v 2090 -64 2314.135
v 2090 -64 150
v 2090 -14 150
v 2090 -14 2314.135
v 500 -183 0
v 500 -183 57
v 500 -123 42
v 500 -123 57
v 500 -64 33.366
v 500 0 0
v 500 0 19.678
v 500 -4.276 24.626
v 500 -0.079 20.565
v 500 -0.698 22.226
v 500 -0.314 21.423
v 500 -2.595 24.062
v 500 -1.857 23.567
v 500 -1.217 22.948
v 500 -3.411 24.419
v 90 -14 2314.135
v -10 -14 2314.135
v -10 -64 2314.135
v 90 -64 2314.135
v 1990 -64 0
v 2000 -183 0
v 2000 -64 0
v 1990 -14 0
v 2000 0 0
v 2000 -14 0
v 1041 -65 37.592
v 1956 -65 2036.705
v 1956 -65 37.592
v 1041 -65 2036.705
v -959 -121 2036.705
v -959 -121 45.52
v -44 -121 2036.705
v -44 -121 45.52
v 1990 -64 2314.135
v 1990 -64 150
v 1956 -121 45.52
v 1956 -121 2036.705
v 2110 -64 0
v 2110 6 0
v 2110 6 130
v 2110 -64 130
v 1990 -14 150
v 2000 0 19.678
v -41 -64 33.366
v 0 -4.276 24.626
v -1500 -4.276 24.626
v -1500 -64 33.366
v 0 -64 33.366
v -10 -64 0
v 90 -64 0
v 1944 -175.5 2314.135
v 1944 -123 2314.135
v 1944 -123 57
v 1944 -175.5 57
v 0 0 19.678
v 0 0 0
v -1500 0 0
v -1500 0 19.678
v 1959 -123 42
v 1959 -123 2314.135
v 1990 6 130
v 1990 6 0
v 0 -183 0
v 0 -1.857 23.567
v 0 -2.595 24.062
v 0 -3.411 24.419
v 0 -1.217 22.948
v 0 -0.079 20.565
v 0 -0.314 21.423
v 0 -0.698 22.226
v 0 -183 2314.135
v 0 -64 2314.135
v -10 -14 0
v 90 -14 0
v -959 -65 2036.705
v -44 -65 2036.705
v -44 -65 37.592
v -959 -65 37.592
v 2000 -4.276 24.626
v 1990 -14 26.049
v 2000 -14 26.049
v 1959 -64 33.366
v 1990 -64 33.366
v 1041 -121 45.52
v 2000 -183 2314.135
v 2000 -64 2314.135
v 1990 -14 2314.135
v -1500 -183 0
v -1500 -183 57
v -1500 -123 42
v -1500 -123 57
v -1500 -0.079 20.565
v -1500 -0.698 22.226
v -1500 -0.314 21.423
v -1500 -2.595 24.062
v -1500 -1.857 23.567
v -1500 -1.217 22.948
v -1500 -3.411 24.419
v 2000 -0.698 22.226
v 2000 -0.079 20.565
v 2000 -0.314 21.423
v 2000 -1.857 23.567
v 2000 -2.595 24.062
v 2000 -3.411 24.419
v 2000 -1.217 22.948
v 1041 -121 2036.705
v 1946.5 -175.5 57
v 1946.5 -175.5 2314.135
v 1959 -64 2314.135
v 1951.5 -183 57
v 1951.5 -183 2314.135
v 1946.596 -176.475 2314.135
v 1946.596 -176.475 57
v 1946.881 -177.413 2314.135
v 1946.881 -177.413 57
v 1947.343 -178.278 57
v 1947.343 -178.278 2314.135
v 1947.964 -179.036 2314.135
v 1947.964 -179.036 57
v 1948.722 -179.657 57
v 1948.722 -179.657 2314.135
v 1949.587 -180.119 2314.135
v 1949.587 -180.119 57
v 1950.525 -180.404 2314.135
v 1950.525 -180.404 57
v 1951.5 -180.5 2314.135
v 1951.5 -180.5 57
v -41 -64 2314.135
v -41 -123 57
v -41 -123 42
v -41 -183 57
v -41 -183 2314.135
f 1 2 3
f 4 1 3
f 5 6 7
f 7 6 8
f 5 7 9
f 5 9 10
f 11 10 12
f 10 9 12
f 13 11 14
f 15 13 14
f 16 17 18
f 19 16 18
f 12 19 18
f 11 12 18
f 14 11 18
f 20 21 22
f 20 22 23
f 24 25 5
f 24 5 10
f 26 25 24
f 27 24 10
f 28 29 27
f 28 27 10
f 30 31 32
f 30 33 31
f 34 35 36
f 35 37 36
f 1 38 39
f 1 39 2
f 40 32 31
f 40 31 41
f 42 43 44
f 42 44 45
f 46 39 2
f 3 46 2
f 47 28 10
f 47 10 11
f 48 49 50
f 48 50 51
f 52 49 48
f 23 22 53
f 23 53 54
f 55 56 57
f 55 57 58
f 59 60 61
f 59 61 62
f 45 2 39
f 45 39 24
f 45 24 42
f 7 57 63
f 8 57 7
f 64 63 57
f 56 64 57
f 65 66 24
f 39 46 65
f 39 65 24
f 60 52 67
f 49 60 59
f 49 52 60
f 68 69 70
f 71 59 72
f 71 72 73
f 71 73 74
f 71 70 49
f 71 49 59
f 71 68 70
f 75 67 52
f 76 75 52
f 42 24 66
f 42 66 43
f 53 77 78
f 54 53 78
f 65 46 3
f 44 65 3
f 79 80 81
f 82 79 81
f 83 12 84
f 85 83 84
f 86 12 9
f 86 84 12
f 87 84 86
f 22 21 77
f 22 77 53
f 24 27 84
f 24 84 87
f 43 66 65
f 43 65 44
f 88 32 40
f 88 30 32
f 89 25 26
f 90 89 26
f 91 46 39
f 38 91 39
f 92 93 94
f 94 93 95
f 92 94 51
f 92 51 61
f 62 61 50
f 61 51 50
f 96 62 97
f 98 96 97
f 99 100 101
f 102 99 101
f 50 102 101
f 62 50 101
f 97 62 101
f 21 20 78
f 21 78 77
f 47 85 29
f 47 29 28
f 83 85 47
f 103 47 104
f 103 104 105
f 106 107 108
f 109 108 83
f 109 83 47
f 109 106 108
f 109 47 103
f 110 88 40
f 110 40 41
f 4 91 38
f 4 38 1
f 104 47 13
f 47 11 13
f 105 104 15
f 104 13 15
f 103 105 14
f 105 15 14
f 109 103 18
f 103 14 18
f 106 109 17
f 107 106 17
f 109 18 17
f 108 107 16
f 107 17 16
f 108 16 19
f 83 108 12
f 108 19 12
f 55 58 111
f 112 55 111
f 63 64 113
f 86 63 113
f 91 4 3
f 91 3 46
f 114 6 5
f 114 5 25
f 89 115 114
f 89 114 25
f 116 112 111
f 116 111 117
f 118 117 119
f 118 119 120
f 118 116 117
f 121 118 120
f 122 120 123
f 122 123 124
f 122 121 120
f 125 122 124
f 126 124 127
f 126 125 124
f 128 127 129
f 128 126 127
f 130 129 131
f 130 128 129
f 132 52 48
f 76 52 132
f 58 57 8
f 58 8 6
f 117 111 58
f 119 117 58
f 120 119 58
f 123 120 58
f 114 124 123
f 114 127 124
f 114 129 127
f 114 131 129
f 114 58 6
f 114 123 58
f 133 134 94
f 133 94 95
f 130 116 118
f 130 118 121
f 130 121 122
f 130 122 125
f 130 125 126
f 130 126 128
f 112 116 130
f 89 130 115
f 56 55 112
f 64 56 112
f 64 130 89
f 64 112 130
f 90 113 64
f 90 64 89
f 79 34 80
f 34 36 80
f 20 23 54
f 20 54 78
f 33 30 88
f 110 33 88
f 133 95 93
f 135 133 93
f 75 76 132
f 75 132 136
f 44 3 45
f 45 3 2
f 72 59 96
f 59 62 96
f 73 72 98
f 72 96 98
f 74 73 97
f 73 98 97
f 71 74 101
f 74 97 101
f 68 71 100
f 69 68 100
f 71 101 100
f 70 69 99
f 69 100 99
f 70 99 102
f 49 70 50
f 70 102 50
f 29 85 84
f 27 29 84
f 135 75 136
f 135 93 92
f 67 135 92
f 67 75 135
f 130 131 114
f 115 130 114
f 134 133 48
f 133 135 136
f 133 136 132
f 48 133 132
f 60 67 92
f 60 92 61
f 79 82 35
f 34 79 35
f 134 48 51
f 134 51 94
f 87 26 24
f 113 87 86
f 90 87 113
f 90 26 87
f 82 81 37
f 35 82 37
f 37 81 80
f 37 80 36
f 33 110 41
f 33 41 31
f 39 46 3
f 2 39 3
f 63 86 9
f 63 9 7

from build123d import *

# Parameters (mm, degrees)
F1_DEPTH  = 1500
F2_DEPTH  = 56
F4_DEPTH  = 3
F5_DEPTH  = 900
F7_DEPTH  = 2314.1348951653
F9_DEPTH  = 150
F10_W     = 120
F10_H     = 70
F11_DEPTH = 150
F12_SIZE  = 20
F13_R     = 5
F13_2_R   = 5
F14_DEPTH = 15
F15_DEPTH = 15
F16_DEPTH = 15
F17_DEPTH = 15
F19_DEPTH = 2257.1348951653


# Not quite as in the source:
# - a feature of the source that left no trace in its solid (it failed there, or was rolled back) is left out


with BuildPart() as f1:
    # F0 (on Right) → F1 (new body)
    with BuildSketch(Plane.YZ):
        Polygon((-183, 0), (0, 0), (0, 24), (-64, 33.3658536585), (-123, 42), (-123, 57), (-183, 57), align=None)
    extrude(amount=-F1_DEPTH)

    # F0 (on Right) → F2 (join)
    with BuildSketch(Plane.YZ):
        Polygon((-183, 161.9052439928), (-183, 57), (-123, 57), (-123, 42), (-64, 33.3658536585), (-64, 167.0590639114), (-64, 2314.1348951653), (-183, 2314.1348951653), align=None)
        Polygon((-65, 2037.5547998742), (-65, 37.5547998742), (-121, 45.7499218254), (-121, 2037.5547998742), align=None, mode=Mode.SUBTRACT)
        Polygon((-121, 45.7499218254), (-65, 37.5547998742), (-65, 2037.5547998742), (-121, 2037.5547998742), align=None)
    extrude(amount=-F2_DEPTH)


with BuildPart() as f4:
    # F3 (on face) → F4 (new body)
    with BuildSketch(Plane(origin=(-56, 0, 0), x_dir=(0, -1, 0), z_dir=(-1, 0, 0))):
        Polygon((65, 37.5920394199), (121, 45.5200997288), (121, 2036.7051838202), (65, 2036.7051838202), align=None)
    extrude(amount=F4_DEPTH)


with BuildPart() as f5:
    # F5 (new): a face of the model
    f5_faces = [f4.part.faces().sort_by_distance(p)[0] for p in [
        (-59, -92.9814562157, 1039.1293140523),
    ]]
    extrude(f5_faces, amount=F5_DEPTH)


with BuildPart() as f7:
    # F6 (on face) → F7 (new body, through all)
    with BuildSketch(Plane.XY.offset(2314.1348951653)):
        Polygon((-10, -14), (-10, -64), (0, -64), (90, -64), (90, -14), align=None)
    extrude(amount=-F7_DEPTH)


with BuildPart() as f8_1:
    # F8: copy of F7
    add(f7.part.moved(Location((2000, 0, 0))))


with BuildPart() as f8_2:
    # F8: copy of F1
    add(f1.part.moved(Location((2000, 0, 0))))


with BuildPart() as f8_3:
    # F8: copy of F5
    add(f5.part.moved(Location((2000, 0, 0))))

    # F17 (add): a face of the model
    f17_faces = [f8_3.faces().sort_by_distance(p)[0] for p in [
        (1941, -92.9814562157, 1039.1293140523),
    ]]
    extrude(f17_faces, amount=F17_DEPTH)


with BuildPart() as f9_tool:
    # F9 (cut): a face of the model
    f9_faces = [f8_1.part.faces().sort_by_distance(p)[0] for p in [
        (2040, -39, 0),
    ]]
    extrude(f9_faces, amount=-F9_DEPTH)


with BuildPart() as f8_1_1:
    add(f8_1.part)

    # F9: cut by f9_tool
    add(f9_tool.part, mode=Mode.SUBTRACT)


with BuildPart() as f8_2_1:
    add(f8_2.part)

    # F9: cut by f9_tool
    add(f9_tool.part, mode=Mode.SUBTRACT)

    # F13#2
    f13_2_edges = [f8_2_1.edges().sort_by_distance(p)[0] for p in [
        (1250, 0, 24),
    ]]
    fillet(f13_2_edges, radius=F13_2_R)

    # F16 (cut): a face of the model
    f16_faces = [f8_2_1.faces().sort_by_distance(p)[0] for p in [
        (1944, -123.3639578476, 1180.7575057396),
    ]]
    extrude(f16_faces, amount=-F16_DEPTH, mode=Mode.SUBTRACT)

    # F18 (on face) → F19 (join, through all)
    with BuildSketch(Plane.XY.offset(2314.1348951653)):
        with BuildLine():
            Line((1951.5, -183), (1959, -183))
            Line((1959, -183), (1959, -123))
            Line((1959, -123), (1944, -123))
            Line((1944, -123), (1944, -175.5))
            Line((1944, -175.5), (1946.5, -175.5))
            ThreePointArc((1946.5, -175.5), (1947.9644660941, -179.0355339059), (1951.5, -180.5))
            Line((1951.5, -180.5), (1951.5, -183))
        make_face()
    extrude(amount=-F19_DEPTH)


with BuildPart() as f11:
    # F10 (on face) → F11 (new body)
    with BuildSketch(Plane(origin=(0, 0, 150), x_dir=(1, 0, 0), z_dir=(0, 0, -1))):
        with Locations((2050, 29)):
            Rectangle(F10_W, F10_H)
    extrude(amount=F11_DEPTH)

    # F12
    f12_edges = [f11.edges().sort_by_distance(p)[0] for p in [
        (2050, 6, 150),
        (2110, -29, 150),
    ]]
    chamfer(f12_edges, length=F12_SIZE)


with BuildPart() as f1_1:
    add(f1.part)

    # F13
    f13_edges = [f1_1.edges().sort_by_distance(p)[0] for p in [
        (-750, 0, 24),
    ]]
    fillet(f13_edges, radius=F13_R)

    # F14 (cut): a face of the model
    f14_faces = [f1_1.faces().sort_by_distance(p)[0] for p in [
        (-56, -123.3639578476, 1180.7575057396),
    ]]
    extrude(f14_faces, amount=-F14_DEPTH, mode=Mode.SUBTRACT)


with BuildPart() as f4_1:
    add(f4.part)

    # F15 (add): a face of the model
    f15_faces = [f5.part.faces().sort_by_distance(p)[0] for p in [
        (-59, -92.9814562157, 1039.1293140523),
    ]]

    add(f5.part)  # F15 merges F5
    extrude(f15_faces, amount=F15_DEPTH)


solid = Compound([f7.part, f8_3.part, f8_1_1.part, f8_2_1.part, f11.part, f1_1.part, f4_1.part])
